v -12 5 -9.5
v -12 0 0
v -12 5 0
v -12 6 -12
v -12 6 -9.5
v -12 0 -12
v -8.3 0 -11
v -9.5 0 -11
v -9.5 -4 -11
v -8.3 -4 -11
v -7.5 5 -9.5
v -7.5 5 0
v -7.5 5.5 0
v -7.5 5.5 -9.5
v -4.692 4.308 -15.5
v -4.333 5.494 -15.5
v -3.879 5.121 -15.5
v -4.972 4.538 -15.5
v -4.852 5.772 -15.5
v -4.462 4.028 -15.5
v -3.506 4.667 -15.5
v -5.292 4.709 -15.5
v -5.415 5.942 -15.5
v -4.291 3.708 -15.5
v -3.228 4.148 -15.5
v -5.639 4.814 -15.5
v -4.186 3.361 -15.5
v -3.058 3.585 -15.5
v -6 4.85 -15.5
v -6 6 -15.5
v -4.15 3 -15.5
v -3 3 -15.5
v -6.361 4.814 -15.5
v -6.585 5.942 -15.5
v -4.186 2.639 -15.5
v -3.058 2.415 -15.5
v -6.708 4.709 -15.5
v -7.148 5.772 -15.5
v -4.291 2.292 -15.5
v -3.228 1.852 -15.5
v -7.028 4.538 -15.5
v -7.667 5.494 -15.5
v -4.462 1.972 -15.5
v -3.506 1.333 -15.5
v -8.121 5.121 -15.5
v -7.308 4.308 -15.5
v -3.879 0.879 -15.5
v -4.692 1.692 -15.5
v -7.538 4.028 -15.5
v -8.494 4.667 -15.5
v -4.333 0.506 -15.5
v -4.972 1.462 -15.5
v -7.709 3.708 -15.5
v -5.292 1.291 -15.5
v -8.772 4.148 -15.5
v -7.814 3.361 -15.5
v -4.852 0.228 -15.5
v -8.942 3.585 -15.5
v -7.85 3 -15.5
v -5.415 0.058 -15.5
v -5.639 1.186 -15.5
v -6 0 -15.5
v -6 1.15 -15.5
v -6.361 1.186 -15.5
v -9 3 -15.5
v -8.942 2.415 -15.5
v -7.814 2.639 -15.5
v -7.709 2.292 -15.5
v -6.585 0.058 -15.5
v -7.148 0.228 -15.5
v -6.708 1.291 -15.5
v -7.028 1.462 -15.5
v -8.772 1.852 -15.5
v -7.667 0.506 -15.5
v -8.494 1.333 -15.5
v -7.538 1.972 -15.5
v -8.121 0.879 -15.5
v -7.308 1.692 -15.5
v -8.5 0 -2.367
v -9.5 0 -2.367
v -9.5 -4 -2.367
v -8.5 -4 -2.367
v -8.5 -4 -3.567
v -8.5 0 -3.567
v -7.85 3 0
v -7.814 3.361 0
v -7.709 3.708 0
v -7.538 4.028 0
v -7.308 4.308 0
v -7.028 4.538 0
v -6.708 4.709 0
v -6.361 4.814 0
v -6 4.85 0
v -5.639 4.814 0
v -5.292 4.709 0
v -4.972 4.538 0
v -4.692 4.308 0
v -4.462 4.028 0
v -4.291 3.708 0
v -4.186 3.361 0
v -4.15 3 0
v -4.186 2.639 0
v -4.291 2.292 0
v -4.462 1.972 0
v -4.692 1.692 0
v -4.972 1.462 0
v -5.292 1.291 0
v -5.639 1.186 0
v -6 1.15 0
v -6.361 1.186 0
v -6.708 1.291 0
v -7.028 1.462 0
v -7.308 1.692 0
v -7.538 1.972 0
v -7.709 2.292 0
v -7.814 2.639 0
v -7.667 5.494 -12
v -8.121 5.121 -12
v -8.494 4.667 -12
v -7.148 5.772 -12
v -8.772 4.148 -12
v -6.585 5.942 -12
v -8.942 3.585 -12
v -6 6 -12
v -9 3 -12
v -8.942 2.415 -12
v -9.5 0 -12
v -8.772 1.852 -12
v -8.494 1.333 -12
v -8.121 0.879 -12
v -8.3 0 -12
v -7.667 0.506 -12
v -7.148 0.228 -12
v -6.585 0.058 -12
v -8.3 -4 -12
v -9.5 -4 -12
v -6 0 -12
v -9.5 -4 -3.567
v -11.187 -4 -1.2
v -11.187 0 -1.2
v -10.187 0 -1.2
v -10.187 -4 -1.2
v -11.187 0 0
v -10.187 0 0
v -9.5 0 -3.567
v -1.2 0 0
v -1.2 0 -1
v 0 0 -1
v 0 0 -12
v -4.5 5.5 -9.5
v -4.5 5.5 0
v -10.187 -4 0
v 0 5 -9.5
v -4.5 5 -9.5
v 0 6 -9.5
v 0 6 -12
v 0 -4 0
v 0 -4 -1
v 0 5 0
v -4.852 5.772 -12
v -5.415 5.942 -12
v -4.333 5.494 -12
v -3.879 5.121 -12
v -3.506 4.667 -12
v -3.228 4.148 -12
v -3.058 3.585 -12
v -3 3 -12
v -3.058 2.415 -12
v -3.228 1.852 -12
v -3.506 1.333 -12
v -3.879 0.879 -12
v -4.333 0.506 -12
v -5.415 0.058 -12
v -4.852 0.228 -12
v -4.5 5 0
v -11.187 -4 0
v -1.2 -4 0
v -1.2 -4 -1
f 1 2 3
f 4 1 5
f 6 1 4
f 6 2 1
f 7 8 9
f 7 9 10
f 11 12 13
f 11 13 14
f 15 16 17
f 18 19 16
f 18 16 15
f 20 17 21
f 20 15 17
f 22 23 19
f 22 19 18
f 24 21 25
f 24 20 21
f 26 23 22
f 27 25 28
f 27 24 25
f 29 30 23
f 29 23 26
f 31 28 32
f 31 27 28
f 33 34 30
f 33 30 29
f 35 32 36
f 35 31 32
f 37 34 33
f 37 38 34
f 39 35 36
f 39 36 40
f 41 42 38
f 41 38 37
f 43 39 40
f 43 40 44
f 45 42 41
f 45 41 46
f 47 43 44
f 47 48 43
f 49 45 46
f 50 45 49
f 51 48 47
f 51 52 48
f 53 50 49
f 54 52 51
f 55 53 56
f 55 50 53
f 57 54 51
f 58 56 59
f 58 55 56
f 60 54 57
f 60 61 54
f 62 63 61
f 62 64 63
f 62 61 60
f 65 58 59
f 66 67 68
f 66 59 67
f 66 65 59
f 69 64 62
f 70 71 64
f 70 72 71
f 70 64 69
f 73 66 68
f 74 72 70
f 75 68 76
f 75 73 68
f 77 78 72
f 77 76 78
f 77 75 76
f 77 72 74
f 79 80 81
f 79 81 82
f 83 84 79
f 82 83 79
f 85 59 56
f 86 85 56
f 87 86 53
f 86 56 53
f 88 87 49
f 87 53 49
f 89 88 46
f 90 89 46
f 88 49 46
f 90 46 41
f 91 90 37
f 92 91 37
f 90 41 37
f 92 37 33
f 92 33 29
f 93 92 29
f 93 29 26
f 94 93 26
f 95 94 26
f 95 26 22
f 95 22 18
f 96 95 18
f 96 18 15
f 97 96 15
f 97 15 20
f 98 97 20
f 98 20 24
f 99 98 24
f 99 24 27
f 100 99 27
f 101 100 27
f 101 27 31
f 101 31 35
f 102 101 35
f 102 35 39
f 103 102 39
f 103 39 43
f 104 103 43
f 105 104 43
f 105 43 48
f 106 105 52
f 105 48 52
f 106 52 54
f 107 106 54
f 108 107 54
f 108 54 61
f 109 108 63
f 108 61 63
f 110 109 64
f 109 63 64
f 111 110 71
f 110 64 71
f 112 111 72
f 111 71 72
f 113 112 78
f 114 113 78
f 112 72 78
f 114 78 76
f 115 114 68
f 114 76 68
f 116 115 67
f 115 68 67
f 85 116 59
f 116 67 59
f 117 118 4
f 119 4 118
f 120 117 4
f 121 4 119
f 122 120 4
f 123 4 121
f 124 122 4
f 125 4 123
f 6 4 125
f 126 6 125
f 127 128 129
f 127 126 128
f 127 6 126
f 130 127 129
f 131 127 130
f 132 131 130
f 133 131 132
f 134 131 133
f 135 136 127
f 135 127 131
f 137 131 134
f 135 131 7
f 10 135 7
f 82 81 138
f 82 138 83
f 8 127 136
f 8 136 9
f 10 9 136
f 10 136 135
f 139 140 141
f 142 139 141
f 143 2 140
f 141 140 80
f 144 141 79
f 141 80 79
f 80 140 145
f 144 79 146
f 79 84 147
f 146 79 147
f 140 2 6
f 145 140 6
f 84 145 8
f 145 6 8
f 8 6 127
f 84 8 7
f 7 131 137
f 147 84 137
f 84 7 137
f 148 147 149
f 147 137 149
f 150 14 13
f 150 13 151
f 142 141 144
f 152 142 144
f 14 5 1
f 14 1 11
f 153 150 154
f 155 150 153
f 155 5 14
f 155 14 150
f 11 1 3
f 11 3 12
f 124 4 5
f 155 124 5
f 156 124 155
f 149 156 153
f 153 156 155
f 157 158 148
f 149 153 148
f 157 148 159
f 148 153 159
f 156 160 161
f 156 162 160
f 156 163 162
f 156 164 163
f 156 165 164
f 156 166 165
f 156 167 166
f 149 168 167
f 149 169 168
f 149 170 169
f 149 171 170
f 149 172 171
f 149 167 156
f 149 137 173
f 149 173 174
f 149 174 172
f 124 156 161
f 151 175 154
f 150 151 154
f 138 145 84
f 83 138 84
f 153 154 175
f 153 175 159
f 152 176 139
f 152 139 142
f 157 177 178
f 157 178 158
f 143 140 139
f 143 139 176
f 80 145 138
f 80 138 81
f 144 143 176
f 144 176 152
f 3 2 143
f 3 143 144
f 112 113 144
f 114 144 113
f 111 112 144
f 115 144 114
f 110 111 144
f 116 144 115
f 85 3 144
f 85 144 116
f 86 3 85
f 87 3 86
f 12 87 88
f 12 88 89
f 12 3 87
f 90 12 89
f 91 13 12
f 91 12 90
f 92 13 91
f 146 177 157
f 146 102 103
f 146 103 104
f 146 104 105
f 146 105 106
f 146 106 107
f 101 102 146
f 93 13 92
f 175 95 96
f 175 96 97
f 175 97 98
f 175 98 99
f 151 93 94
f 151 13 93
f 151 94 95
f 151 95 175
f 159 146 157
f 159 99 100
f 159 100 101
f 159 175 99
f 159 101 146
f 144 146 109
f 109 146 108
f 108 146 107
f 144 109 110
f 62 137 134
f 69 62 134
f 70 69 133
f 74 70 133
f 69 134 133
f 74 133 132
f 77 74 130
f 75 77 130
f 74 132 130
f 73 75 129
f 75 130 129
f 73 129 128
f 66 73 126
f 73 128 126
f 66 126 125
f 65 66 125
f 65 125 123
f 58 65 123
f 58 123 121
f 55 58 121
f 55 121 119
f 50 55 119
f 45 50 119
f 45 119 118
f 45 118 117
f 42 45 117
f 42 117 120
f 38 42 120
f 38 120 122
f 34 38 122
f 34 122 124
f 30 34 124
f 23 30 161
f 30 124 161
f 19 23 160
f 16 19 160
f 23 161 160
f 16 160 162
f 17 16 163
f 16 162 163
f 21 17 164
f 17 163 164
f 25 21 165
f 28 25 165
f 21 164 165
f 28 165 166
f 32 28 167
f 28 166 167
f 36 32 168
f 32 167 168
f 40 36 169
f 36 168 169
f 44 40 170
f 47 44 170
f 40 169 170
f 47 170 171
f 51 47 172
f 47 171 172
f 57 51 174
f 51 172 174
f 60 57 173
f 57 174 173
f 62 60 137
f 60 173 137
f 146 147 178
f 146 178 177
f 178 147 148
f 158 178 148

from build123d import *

# Parameters (mm, degrees)
SKETCH1_W           = 12
SKETCH1_H           = 12
BOSS_EXTRUDE1_DEPTH = 6
SKETCH3_W           = 12
SKETCH3_H           = 9.5
CUT_EXTRUDE1_DEPTH  = 1
SKETCH4_W           = 3
SKETCH4_H           = 9.5
BOSS_EXTRUDE2_DEPTH = 0.5
SKETCH6_R           = 3
BOSS_EXTRUDE3_DEPTH = 3.5
SKETCH7_R           = 1.85
CUT_EXTRUDE2_DEPTH  = 21.5
SKETCH8_W           = 1.2
SKETCH8_H           = 1
SKETCH8_W_2         = 1
SKETCH8_H_2         = 1.2
BOSS_EXTRUDE4_DEPTH = 4


with BuildPart() as part:
    # Sketch1 → Boss-Extrude1 (new body)
    with BuildSketch(Plane(origin=(0, 0, 0), x_dir=(1, 0, 0), z_dir=(0, 1, 0))):
        with Locations((-6, 6)):
            Rectangle(SKETCH1_W, SKETCH1_H)
    extrude(amount=BOSS_EXTRUDE1_DEPTH)

    # Sketch3 → Cut-Extrude1 (cut)
    with BuildSketch(Plane(origin=(0, 6, 0), x_dir=(1, 0, 0), z_dir=(0, 1, 0))):
        with Locations((-6, 4.75)):
            Rectangle(SKETCH3_W, SKETCH3_H)
    extrude(amount=-CUT_EXTRUDE1_DEPTH, mode=Mode.SUBTRACT)

    # Sketch4 → Boss-Extrude2 (add)
    with BuildSketch(Plane(origin=(0, 5, 0), x_dir=(1, 0, 0), z_dir=(0, 1, 0))):
        with Locations((-6, 4.75)):
            Rectangle(SKETCH4_W, SKETCH4_H)
    extrude(amount=BOSS_EXTRUDE2_DEPTH)

    # Sketch6 → Boss-Extrude3 (add)
    with BuildSketch(Plane(origin=(0, 0, -12), x_dir=(-1, 0, 0), z_dir=(0, 0, -1))):
        with Locations(Location((6, 3, 0), (0, 0, 270))):
            Circle(SKETCH6_R)
    extrude(amount=BOSS_EXTRUDE3_DEPTH)

    # Sketch7 → Cut-Extrude2 (cut, through all)
    with BuildSketch(Plane(origin=(0, 0, -15.5), x_dir=(-1, 0, 0), z_dir=(0, 0, -1))):
        with Locations((6, 3)):
            Circle(SKETCH7_R)
    extrude(amount=-CUT_EXTRUDE2_DEPTH, mode=Mode.SUBTRACT)

    # Sketch8 → Boss-Extrude4 (add)
    with BuildSketch(Plane.XZ):
        with Locations((-8.9, -11.5)):
            Rectangle(SKETCH8_W, SKETCH8_H)
        with Locations((-10.686701077, -0.6)):
            Rectangle(SKETCH8_W_2, SKETCH8_H_2)
        with Locations((-0.6, -0.5)):
            Rectangle(SKETCH8_W, SKETCH8_H)
        with Locations((-9, -2.967121794)):
            Rectangle(SKETCH8_W_2, SKETCH8_H_2)
    extrude(amount=BOSS_EXTRUDE4_DEPTH)


solid = part.part
